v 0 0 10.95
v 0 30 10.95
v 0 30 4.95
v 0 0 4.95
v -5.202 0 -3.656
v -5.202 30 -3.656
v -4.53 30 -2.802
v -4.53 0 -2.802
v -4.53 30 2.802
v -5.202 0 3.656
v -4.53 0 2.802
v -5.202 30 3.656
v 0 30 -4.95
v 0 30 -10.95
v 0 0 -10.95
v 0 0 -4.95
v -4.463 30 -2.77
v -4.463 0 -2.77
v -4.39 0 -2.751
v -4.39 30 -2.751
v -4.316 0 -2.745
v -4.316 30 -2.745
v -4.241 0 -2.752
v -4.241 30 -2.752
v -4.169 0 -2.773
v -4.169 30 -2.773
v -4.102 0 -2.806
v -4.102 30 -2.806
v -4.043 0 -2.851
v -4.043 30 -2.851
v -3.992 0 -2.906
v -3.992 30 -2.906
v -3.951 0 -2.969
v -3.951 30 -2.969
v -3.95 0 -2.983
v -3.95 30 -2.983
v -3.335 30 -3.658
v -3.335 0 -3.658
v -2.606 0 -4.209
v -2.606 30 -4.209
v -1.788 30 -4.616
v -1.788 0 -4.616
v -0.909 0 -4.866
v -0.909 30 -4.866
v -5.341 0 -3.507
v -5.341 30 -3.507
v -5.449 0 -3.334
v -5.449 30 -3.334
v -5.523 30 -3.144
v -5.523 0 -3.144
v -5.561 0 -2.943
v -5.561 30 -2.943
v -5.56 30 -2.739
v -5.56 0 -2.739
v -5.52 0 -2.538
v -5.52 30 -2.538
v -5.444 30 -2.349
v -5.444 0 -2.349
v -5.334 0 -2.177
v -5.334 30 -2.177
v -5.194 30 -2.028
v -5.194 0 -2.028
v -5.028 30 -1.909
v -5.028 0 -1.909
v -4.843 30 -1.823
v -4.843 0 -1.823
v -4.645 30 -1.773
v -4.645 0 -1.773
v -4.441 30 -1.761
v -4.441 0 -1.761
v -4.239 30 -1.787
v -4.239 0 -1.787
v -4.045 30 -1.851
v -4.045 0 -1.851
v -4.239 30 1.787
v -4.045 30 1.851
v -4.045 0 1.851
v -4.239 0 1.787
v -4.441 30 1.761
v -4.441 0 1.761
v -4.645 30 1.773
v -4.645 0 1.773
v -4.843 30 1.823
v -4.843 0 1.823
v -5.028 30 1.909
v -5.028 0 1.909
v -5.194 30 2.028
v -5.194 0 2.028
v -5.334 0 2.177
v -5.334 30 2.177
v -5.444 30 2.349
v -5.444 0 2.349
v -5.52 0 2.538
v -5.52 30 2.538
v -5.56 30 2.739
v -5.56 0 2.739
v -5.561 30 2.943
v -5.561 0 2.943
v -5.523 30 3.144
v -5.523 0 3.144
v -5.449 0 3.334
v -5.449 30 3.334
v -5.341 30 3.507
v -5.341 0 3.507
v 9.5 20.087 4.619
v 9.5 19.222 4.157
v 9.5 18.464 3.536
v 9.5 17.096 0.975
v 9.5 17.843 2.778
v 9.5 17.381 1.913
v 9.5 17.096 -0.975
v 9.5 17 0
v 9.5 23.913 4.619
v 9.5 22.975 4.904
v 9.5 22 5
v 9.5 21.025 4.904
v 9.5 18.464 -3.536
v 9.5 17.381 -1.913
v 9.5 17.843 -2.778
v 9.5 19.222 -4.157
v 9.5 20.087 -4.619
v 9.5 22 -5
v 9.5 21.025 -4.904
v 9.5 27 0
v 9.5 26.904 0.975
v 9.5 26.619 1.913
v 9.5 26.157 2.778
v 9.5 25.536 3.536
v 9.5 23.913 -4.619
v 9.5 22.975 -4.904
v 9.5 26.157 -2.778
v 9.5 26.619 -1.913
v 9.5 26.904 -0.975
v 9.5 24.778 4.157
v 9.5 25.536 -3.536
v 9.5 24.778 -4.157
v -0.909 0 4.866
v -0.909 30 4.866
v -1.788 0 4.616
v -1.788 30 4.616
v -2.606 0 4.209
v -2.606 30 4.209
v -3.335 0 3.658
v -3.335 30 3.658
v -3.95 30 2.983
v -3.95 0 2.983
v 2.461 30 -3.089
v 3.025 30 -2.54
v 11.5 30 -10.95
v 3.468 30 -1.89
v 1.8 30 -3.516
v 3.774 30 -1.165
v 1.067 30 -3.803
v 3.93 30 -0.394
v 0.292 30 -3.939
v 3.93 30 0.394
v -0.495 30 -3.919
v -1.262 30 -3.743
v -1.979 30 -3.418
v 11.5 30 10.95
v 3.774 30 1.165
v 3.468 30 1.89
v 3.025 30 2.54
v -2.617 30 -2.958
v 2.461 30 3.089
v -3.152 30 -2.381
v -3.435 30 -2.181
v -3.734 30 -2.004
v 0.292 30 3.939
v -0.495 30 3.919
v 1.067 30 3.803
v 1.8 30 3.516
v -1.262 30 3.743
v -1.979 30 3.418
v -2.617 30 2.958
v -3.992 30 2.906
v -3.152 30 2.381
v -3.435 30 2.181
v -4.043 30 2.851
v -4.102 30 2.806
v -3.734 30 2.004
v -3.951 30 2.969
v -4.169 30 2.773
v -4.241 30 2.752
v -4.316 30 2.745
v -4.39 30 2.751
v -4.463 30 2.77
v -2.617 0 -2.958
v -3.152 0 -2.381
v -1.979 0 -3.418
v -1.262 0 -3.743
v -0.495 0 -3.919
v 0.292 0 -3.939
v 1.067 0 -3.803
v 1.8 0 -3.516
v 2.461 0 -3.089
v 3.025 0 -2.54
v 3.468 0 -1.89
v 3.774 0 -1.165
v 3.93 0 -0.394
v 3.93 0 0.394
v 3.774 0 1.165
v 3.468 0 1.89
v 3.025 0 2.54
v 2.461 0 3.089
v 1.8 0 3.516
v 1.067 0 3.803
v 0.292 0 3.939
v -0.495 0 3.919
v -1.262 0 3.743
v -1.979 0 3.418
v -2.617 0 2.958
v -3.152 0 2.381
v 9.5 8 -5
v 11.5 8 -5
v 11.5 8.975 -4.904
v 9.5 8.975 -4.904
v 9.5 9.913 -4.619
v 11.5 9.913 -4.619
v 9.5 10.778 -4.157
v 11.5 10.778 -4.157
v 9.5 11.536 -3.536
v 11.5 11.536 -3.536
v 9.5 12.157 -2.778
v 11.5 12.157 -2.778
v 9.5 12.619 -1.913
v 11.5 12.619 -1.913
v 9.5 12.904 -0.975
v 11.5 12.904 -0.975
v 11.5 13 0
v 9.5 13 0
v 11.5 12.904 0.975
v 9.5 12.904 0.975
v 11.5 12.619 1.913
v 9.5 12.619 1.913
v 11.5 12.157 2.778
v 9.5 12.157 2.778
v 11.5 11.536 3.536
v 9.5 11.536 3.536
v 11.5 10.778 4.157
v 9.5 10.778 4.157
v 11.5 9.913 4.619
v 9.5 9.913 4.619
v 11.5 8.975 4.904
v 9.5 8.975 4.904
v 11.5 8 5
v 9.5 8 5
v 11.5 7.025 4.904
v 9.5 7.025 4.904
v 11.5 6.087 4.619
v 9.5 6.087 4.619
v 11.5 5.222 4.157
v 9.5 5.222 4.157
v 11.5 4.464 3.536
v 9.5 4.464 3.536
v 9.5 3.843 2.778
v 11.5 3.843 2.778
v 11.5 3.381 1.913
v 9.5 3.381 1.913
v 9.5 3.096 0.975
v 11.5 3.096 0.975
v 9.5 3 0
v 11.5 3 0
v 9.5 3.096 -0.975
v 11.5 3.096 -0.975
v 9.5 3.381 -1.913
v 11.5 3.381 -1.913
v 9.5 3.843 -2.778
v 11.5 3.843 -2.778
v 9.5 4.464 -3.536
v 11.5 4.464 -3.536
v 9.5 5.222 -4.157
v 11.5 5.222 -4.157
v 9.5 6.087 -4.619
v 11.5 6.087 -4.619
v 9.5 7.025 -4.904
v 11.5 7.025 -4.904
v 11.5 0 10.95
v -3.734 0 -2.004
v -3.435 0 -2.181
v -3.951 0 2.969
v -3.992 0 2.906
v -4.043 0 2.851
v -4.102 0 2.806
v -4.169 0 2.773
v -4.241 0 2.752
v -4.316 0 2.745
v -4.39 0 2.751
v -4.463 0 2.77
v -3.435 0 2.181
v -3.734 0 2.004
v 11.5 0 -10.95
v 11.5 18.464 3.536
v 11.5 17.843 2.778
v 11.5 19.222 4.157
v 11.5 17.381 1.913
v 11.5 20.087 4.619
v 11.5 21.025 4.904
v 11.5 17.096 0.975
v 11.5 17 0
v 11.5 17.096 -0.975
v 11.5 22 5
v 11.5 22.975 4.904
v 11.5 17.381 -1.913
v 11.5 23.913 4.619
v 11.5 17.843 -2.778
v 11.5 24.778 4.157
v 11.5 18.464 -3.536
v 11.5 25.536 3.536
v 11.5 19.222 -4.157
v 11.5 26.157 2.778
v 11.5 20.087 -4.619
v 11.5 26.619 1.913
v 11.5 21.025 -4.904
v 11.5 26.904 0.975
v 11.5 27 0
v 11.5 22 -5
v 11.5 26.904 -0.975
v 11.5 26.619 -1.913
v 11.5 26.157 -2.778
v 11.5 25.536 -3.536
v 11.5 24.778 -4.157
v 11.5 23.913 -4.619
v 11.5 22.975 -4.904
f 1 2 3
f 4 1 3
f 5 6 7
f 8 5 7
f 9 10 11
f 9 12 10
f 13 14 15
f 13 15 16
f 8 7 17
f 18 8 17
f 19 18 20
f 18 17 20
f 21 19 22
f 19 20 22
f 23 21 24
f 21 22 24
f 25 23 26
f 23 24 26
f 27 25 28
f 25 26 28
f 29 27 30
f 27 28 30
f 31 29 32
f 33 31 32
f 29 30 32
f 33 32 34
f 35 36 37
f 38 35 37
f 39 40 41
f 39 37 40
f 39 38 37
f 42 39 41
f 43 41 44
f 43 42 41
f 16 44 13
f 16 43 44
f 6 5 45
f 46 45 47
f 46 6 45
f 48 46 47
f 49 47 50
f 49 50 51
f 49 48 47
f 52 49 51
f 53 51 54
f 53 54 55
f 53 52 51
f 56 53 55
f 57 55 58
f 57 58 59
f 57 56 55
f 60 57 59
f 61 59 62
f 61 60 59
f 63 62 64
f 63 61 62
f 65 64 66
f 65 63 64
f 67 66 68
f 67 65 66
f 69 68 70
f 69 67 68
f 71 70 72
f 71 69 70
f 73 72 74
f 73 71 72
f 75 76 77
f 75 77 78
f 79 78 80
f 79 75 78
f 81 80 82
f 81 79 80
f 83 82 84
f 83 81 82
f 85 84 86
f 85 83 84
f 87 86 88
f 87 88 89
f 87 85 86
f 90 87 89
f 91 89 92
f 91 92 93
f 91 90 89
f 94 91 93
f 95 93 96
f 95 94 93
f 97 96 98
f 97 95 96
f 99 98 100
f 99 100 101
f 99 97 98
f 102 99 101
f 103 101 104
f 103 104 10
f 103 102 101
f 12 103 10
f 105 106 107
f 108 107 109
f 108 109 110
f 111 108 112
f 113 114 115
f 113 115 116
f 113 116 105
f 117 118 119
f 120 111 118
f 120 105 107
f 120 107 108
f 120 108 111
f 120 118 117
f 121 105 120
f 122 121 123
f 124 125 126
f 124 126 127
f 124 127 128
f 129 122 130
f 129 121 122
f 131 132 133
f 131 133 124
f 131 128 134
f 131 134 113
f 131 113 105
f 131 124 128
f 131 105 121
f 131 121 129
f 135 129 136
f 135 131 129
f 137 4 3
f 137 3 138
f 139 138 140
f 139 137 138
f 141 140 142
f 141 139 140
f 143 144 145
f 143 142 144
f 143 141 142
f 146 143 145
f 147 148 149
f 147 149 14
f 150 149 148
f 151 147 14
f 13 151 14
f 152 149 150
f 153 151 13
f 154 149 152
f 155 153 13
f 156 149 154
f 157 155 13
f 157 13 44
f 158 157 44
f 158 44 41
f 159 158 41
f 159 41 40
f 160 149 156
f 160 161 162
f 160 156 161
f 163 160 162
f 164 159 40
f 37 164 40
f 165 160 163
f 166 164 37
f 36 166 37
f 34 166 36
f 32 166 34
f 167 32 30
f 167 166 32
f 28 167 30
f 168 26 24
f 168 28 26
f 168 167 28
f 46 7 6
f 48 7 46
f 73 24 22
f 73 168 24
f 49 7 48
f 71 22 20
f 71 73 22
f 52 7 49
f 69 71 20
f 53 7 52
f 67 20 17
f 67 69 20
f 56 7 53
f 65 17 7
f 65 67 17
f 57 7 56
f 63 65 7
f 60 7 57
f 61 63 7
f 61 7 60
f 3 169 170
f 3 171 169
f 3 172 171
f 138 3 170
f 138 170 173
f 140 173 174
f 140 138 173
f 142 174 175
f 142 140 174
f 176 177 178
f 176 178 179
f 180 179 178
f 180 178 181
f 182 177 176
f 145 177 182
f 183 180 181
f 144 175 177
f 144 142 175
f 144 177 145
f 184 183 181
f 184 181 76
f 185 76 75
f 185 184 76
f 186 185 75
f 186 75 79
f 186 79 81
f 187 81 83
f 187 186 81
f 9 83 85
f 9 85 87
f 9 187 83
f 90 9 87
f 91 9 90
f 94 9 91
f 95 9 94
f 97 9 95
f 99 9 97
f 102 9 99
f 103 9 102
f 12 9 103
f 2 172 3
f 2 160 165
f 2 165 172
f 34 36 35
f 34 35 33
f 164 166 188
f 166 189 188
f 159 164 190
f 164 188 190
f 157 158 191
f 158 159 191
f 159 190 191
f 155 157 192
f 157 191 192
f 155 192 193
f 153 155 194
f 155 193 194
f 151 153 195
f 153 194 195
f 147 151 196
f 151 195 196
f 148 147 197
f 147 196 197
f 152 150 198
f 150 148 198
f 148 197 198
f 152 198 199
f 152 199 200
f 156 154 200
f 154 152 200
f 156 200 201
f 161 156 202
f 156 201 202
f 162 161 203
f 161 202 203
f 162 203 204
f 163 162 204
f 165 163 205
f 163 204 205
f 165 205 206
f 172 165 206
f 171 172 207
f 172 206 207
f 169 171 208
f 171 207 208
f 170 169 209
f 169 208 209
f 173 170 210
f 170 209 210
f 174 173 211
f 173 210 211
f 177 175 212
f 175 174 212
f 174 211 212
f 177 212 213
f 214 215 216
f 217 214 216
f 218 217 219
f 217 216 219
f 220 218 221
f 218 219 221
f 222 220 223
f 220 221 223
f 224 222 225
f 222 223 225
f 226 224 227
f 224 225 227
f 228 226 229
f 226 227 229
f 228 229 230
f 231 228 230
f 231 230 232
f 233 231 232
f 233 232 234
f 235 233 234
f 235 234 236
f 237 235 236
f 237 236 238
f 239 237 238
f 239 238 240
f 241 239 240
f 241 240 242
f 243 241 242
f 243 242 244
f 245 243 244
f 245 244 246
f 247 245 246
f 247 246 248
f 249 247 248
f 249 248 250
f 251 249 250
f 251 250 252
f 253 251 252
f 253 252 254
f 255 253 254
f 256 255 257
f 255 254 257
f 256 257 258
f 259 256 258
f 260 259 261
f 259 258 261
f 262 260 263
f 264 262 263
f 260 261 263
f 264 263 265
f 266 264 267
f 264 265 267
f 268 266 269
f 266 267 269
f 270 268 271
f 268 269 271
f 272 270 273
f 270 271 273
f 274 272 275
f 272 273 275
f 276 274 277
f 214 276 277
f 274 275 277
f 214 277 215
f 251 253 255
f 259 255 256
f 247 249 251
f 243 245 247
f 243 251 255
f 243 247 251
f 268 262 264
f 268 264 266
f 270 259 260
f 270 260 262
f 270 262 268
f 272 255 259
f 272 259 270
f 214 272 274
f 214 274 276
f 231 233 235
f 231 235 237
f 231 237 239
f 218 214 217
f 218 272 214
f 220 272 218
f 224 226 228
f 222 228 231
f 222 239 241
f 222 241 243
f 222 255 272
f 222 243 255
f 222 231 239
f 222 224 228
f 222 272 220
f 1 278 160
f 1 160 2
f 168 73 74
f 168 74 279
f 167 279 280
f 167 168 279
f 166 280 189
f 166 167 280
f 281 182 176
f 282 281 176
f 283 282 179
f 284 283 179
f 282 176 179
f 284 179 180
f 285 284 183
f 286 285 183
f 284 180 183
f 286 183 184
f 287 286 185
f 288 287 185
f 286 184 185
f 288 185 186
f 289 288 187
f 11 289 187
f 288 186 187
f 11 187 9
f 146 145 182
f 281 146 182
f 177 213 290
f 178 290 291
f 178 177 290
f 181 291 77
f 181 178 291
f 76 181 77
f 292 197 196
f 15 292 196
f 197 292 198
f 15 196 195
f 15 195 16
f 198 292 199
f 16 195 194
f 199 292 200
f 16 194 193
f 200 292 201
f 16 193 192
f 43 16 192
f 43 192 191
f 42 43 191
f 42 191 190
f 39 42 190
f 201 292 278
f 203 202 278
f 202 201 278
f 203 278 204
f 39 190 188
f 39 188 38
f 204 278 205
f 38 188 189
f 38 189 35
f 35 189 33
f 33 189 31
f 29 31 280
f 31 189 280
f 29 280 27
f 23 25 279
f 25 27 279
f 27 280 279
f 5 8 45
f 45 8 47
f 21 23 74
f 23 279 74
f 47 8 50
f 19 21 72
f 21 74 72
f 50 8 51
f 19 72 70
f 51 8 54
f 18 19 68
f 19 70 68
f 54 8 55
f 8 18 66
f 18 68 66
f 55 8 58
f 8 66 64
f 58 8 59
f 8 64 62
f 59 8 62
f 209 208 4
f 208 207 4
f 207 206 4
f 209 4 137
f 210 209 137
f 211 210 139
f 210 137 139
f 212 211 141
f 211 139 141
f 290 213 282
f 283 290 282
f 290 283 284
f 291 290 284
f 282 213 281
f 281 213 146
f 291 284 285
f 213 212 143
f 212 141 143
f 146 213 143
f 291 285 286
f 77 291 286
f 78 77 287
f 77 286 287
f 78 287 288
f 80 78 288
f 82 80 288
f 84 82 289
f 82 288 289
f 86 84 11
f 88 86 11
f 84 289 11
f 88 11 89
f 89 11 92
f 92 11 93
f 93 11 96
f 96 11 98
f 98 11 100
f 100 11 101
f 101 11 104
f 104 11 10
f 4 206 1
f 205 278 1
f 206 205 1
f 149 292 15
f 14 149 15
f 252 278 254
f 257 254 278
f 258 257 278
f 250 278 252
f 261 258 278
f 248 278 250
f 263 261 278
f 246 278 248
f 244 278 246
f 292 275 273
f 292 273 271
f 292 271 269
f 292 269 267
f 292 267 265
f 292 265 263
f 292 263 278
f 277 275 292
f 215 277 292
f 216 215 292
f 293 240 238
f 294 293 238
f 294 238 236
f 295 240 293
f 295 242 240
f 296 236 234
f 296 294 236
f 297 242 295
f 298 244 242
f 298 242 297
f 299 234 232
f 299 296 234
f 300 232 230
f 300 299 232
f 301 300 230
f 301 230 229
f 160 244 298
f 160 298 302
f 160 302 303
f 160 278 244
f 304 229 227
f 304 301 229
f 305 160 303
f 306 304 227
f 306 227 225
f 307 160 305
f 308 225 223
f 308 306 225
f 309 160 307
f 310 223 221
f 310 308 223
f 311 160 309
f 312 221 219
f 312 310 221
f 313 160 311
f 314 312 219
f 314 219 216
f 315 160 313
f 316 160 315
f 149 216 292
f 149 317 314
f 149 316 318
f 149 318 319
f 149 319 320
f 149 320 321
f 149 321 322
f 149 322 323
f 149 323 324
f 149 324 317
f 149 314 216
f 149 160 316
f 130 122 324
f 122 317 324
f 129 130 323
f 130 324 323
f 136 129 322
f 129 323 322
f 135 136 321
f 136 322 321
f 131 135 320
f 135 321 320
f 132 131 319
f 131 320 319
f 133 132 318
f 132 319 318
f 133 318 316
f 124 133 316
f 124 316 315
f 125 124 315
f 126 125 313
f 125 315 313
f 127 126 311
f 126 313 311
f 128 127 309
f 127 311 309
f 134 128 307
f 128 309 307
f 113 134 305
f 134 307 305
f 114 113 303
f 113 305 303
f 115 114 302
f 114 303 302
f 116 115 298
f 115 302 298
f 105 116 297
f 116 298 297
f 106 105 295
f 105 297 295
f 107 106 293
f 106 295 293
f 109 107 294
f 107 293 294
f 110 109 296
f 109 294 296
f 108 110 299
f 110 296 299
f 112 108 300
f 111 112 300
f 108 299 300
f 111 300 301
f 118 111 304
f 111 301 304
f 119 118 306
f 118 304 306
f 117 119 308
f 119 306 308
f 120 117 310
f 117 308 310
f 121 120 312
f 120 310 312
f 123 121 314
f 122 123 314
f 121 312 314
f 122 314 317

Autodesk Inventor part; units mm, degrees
ref_plane "YZ Plane" through (0, 0, 0) normal (1, 0, 0) x (0, 1, 0)
ref_plane "XZ Plane" through (0, 0, 0) normal (0, 1, 0) x (-1, 0, 0)
sketch "Эскиз1" plane through (0, 0, 0) normal (0, 1, 0) x (-1, 0, 0)
  circle A0 centre (0, 0) radius 3.95
  circle A1 centre (0, 0) radius 4.95
  line L0 (0, 0) -> (3.95, 2.9833)
  line L1 (0, 0) -> (3.95, -2.9833)
  point P0 (3.152, -2.3806)
  point P1 (3.152, 2.3806)
  dimension "d0" = 7.9
  dimension "d1" = 9.9
extrude "Выдавливание1" add sketch "Эскиз1" along normal blind 30 contours A0 L1 A1 L0 picked at (3.1693, 3.3115)
sketch "Эскиз2" plane through (0, 30, 0) normal (0, 1, 0) x (1, 0, 0)
  arc A0 (-3.152, -2.3806) -> (-4.0447, -1.8507) centre (-5.8533, -5.9145) ccw
  arc A1 (-4.0447, -1.8507) -> (-5.2016, -3.6565) centre (-4.4791, -2.8459) ccw
  line L0 (-5.2016, -3.6565) -> (-4.5303, -2.802)
  arc A2 (-3.9514, -2.9687) -> (-4.5303, -2.802) centre (-4.3197, -3.1592) ccw
  line L1 (0, 0) -> (-3.2711, 0)
  arc A3 (-4.0447, 1.8507) -> (-3.152, 2.3806) centre (-5.8533, 5.9145) ccw
  arc A4 (-5.2016, 3.6565) -> (-4.0447, 1.8507) centre (-4.4791, 2.8459) ccw
  line L2 (-5.2016, 3.6565) -> (-4.5303, 2.802)
  arc A5 (-4.5303, 2.802) -> (-3.9514, 2.9687) centre (-4.3197, 3.1592) ccw
  line L3 (-3.152, -2.3806) -> (-3.95, -2.9833) projected
  line L4 (-3.95, -2.9833) -> (-3.152, -2.3806)
  line L5 (-3.95, -2.9833) -> (-3.9514, -2.9687)
  line L6 (-3.152, 2.3806) -> (-3.95, 2.9833)
  line L7 (-3.95, 2.9833) -> (-3.9514, 2.9687)
extrude "Выдавливание2" add sketch "Эскиз2" against normal blind 30
sketch "Эскиз3" plane through (0, 30, 0) normal (0, 1, 0) x (1, 0, 0)
  arc A0 (-3.95, -2.9833) -> (-3.95, 2.9833) centre (0, 0) ccw projected
  line L0 (11.5, -6.95) -> (11.5, 6.95)
  arc A1 (-3.152, -2.3806) -> (-3.152, 2.3806) centre (0, 0) ccw projected
  arc A2 (0, -3.95) -> (0, 3.95) centre (0, 0) ccw
  line L1 (0, -4.95) -> (0, -3.95)
  line L2 (0, 3.95) -> (0, 4.95)
  line L3 (11.5, 6.95) -> (11.5, 10.95)
  line L4 (11.5, -6.95) -> (11.5, -10.95)
  line L5 (11.5, 10.95) -> (0, 10.95)
  line L6 (0, 10.95) -> (0, 4.95)
  line L7 (11.5, -10.95) -> (0, -10.95)
  line L8 (0, -10.95) -> (0, -4.95)
  dimension "d13" = 4
  dimension "d14" = 4
  dimension "d21" = 11.5
  dimension "d22" = 21.9
  dimension "d23" = 7
extrude "Выдавливание3" add sketch "Эскиз3" against normal blind 30 contours A0 L6 L5 L3 L0 L4 L7 L8
sketch "Эскиз4" plane through (11.5, 20, 4.95) normal (1, 0, 0) x (0, 0, -1)
  line L0 (4.95, -20) -> (4.95, 10)
  line L1 (1, 10) -> (8.9, 10) projected
  circle A0 centre (4.95, -12) radius 5
  line L2 (15.9, -20) -> (-6, -20) projected
  circle A1 centre (4.95, 2) radius 5
  line L3 (-6, 10) -> (15.9, 10) projected
  point P0 (7.3306, 10)
  point P1 (2.5694, 10)
  point P2 (4.95, -20)
  point P3 (4.95, 10)
  dimension "d15" = 10
  dimension "d16" = 8
  dimension "d17" = 10
  dimension "d18" = 8
extrude "Выдавливание4" cut sketch "Эскиз4" against normal blind 2
properties part number "крепление маркера 8мм"
